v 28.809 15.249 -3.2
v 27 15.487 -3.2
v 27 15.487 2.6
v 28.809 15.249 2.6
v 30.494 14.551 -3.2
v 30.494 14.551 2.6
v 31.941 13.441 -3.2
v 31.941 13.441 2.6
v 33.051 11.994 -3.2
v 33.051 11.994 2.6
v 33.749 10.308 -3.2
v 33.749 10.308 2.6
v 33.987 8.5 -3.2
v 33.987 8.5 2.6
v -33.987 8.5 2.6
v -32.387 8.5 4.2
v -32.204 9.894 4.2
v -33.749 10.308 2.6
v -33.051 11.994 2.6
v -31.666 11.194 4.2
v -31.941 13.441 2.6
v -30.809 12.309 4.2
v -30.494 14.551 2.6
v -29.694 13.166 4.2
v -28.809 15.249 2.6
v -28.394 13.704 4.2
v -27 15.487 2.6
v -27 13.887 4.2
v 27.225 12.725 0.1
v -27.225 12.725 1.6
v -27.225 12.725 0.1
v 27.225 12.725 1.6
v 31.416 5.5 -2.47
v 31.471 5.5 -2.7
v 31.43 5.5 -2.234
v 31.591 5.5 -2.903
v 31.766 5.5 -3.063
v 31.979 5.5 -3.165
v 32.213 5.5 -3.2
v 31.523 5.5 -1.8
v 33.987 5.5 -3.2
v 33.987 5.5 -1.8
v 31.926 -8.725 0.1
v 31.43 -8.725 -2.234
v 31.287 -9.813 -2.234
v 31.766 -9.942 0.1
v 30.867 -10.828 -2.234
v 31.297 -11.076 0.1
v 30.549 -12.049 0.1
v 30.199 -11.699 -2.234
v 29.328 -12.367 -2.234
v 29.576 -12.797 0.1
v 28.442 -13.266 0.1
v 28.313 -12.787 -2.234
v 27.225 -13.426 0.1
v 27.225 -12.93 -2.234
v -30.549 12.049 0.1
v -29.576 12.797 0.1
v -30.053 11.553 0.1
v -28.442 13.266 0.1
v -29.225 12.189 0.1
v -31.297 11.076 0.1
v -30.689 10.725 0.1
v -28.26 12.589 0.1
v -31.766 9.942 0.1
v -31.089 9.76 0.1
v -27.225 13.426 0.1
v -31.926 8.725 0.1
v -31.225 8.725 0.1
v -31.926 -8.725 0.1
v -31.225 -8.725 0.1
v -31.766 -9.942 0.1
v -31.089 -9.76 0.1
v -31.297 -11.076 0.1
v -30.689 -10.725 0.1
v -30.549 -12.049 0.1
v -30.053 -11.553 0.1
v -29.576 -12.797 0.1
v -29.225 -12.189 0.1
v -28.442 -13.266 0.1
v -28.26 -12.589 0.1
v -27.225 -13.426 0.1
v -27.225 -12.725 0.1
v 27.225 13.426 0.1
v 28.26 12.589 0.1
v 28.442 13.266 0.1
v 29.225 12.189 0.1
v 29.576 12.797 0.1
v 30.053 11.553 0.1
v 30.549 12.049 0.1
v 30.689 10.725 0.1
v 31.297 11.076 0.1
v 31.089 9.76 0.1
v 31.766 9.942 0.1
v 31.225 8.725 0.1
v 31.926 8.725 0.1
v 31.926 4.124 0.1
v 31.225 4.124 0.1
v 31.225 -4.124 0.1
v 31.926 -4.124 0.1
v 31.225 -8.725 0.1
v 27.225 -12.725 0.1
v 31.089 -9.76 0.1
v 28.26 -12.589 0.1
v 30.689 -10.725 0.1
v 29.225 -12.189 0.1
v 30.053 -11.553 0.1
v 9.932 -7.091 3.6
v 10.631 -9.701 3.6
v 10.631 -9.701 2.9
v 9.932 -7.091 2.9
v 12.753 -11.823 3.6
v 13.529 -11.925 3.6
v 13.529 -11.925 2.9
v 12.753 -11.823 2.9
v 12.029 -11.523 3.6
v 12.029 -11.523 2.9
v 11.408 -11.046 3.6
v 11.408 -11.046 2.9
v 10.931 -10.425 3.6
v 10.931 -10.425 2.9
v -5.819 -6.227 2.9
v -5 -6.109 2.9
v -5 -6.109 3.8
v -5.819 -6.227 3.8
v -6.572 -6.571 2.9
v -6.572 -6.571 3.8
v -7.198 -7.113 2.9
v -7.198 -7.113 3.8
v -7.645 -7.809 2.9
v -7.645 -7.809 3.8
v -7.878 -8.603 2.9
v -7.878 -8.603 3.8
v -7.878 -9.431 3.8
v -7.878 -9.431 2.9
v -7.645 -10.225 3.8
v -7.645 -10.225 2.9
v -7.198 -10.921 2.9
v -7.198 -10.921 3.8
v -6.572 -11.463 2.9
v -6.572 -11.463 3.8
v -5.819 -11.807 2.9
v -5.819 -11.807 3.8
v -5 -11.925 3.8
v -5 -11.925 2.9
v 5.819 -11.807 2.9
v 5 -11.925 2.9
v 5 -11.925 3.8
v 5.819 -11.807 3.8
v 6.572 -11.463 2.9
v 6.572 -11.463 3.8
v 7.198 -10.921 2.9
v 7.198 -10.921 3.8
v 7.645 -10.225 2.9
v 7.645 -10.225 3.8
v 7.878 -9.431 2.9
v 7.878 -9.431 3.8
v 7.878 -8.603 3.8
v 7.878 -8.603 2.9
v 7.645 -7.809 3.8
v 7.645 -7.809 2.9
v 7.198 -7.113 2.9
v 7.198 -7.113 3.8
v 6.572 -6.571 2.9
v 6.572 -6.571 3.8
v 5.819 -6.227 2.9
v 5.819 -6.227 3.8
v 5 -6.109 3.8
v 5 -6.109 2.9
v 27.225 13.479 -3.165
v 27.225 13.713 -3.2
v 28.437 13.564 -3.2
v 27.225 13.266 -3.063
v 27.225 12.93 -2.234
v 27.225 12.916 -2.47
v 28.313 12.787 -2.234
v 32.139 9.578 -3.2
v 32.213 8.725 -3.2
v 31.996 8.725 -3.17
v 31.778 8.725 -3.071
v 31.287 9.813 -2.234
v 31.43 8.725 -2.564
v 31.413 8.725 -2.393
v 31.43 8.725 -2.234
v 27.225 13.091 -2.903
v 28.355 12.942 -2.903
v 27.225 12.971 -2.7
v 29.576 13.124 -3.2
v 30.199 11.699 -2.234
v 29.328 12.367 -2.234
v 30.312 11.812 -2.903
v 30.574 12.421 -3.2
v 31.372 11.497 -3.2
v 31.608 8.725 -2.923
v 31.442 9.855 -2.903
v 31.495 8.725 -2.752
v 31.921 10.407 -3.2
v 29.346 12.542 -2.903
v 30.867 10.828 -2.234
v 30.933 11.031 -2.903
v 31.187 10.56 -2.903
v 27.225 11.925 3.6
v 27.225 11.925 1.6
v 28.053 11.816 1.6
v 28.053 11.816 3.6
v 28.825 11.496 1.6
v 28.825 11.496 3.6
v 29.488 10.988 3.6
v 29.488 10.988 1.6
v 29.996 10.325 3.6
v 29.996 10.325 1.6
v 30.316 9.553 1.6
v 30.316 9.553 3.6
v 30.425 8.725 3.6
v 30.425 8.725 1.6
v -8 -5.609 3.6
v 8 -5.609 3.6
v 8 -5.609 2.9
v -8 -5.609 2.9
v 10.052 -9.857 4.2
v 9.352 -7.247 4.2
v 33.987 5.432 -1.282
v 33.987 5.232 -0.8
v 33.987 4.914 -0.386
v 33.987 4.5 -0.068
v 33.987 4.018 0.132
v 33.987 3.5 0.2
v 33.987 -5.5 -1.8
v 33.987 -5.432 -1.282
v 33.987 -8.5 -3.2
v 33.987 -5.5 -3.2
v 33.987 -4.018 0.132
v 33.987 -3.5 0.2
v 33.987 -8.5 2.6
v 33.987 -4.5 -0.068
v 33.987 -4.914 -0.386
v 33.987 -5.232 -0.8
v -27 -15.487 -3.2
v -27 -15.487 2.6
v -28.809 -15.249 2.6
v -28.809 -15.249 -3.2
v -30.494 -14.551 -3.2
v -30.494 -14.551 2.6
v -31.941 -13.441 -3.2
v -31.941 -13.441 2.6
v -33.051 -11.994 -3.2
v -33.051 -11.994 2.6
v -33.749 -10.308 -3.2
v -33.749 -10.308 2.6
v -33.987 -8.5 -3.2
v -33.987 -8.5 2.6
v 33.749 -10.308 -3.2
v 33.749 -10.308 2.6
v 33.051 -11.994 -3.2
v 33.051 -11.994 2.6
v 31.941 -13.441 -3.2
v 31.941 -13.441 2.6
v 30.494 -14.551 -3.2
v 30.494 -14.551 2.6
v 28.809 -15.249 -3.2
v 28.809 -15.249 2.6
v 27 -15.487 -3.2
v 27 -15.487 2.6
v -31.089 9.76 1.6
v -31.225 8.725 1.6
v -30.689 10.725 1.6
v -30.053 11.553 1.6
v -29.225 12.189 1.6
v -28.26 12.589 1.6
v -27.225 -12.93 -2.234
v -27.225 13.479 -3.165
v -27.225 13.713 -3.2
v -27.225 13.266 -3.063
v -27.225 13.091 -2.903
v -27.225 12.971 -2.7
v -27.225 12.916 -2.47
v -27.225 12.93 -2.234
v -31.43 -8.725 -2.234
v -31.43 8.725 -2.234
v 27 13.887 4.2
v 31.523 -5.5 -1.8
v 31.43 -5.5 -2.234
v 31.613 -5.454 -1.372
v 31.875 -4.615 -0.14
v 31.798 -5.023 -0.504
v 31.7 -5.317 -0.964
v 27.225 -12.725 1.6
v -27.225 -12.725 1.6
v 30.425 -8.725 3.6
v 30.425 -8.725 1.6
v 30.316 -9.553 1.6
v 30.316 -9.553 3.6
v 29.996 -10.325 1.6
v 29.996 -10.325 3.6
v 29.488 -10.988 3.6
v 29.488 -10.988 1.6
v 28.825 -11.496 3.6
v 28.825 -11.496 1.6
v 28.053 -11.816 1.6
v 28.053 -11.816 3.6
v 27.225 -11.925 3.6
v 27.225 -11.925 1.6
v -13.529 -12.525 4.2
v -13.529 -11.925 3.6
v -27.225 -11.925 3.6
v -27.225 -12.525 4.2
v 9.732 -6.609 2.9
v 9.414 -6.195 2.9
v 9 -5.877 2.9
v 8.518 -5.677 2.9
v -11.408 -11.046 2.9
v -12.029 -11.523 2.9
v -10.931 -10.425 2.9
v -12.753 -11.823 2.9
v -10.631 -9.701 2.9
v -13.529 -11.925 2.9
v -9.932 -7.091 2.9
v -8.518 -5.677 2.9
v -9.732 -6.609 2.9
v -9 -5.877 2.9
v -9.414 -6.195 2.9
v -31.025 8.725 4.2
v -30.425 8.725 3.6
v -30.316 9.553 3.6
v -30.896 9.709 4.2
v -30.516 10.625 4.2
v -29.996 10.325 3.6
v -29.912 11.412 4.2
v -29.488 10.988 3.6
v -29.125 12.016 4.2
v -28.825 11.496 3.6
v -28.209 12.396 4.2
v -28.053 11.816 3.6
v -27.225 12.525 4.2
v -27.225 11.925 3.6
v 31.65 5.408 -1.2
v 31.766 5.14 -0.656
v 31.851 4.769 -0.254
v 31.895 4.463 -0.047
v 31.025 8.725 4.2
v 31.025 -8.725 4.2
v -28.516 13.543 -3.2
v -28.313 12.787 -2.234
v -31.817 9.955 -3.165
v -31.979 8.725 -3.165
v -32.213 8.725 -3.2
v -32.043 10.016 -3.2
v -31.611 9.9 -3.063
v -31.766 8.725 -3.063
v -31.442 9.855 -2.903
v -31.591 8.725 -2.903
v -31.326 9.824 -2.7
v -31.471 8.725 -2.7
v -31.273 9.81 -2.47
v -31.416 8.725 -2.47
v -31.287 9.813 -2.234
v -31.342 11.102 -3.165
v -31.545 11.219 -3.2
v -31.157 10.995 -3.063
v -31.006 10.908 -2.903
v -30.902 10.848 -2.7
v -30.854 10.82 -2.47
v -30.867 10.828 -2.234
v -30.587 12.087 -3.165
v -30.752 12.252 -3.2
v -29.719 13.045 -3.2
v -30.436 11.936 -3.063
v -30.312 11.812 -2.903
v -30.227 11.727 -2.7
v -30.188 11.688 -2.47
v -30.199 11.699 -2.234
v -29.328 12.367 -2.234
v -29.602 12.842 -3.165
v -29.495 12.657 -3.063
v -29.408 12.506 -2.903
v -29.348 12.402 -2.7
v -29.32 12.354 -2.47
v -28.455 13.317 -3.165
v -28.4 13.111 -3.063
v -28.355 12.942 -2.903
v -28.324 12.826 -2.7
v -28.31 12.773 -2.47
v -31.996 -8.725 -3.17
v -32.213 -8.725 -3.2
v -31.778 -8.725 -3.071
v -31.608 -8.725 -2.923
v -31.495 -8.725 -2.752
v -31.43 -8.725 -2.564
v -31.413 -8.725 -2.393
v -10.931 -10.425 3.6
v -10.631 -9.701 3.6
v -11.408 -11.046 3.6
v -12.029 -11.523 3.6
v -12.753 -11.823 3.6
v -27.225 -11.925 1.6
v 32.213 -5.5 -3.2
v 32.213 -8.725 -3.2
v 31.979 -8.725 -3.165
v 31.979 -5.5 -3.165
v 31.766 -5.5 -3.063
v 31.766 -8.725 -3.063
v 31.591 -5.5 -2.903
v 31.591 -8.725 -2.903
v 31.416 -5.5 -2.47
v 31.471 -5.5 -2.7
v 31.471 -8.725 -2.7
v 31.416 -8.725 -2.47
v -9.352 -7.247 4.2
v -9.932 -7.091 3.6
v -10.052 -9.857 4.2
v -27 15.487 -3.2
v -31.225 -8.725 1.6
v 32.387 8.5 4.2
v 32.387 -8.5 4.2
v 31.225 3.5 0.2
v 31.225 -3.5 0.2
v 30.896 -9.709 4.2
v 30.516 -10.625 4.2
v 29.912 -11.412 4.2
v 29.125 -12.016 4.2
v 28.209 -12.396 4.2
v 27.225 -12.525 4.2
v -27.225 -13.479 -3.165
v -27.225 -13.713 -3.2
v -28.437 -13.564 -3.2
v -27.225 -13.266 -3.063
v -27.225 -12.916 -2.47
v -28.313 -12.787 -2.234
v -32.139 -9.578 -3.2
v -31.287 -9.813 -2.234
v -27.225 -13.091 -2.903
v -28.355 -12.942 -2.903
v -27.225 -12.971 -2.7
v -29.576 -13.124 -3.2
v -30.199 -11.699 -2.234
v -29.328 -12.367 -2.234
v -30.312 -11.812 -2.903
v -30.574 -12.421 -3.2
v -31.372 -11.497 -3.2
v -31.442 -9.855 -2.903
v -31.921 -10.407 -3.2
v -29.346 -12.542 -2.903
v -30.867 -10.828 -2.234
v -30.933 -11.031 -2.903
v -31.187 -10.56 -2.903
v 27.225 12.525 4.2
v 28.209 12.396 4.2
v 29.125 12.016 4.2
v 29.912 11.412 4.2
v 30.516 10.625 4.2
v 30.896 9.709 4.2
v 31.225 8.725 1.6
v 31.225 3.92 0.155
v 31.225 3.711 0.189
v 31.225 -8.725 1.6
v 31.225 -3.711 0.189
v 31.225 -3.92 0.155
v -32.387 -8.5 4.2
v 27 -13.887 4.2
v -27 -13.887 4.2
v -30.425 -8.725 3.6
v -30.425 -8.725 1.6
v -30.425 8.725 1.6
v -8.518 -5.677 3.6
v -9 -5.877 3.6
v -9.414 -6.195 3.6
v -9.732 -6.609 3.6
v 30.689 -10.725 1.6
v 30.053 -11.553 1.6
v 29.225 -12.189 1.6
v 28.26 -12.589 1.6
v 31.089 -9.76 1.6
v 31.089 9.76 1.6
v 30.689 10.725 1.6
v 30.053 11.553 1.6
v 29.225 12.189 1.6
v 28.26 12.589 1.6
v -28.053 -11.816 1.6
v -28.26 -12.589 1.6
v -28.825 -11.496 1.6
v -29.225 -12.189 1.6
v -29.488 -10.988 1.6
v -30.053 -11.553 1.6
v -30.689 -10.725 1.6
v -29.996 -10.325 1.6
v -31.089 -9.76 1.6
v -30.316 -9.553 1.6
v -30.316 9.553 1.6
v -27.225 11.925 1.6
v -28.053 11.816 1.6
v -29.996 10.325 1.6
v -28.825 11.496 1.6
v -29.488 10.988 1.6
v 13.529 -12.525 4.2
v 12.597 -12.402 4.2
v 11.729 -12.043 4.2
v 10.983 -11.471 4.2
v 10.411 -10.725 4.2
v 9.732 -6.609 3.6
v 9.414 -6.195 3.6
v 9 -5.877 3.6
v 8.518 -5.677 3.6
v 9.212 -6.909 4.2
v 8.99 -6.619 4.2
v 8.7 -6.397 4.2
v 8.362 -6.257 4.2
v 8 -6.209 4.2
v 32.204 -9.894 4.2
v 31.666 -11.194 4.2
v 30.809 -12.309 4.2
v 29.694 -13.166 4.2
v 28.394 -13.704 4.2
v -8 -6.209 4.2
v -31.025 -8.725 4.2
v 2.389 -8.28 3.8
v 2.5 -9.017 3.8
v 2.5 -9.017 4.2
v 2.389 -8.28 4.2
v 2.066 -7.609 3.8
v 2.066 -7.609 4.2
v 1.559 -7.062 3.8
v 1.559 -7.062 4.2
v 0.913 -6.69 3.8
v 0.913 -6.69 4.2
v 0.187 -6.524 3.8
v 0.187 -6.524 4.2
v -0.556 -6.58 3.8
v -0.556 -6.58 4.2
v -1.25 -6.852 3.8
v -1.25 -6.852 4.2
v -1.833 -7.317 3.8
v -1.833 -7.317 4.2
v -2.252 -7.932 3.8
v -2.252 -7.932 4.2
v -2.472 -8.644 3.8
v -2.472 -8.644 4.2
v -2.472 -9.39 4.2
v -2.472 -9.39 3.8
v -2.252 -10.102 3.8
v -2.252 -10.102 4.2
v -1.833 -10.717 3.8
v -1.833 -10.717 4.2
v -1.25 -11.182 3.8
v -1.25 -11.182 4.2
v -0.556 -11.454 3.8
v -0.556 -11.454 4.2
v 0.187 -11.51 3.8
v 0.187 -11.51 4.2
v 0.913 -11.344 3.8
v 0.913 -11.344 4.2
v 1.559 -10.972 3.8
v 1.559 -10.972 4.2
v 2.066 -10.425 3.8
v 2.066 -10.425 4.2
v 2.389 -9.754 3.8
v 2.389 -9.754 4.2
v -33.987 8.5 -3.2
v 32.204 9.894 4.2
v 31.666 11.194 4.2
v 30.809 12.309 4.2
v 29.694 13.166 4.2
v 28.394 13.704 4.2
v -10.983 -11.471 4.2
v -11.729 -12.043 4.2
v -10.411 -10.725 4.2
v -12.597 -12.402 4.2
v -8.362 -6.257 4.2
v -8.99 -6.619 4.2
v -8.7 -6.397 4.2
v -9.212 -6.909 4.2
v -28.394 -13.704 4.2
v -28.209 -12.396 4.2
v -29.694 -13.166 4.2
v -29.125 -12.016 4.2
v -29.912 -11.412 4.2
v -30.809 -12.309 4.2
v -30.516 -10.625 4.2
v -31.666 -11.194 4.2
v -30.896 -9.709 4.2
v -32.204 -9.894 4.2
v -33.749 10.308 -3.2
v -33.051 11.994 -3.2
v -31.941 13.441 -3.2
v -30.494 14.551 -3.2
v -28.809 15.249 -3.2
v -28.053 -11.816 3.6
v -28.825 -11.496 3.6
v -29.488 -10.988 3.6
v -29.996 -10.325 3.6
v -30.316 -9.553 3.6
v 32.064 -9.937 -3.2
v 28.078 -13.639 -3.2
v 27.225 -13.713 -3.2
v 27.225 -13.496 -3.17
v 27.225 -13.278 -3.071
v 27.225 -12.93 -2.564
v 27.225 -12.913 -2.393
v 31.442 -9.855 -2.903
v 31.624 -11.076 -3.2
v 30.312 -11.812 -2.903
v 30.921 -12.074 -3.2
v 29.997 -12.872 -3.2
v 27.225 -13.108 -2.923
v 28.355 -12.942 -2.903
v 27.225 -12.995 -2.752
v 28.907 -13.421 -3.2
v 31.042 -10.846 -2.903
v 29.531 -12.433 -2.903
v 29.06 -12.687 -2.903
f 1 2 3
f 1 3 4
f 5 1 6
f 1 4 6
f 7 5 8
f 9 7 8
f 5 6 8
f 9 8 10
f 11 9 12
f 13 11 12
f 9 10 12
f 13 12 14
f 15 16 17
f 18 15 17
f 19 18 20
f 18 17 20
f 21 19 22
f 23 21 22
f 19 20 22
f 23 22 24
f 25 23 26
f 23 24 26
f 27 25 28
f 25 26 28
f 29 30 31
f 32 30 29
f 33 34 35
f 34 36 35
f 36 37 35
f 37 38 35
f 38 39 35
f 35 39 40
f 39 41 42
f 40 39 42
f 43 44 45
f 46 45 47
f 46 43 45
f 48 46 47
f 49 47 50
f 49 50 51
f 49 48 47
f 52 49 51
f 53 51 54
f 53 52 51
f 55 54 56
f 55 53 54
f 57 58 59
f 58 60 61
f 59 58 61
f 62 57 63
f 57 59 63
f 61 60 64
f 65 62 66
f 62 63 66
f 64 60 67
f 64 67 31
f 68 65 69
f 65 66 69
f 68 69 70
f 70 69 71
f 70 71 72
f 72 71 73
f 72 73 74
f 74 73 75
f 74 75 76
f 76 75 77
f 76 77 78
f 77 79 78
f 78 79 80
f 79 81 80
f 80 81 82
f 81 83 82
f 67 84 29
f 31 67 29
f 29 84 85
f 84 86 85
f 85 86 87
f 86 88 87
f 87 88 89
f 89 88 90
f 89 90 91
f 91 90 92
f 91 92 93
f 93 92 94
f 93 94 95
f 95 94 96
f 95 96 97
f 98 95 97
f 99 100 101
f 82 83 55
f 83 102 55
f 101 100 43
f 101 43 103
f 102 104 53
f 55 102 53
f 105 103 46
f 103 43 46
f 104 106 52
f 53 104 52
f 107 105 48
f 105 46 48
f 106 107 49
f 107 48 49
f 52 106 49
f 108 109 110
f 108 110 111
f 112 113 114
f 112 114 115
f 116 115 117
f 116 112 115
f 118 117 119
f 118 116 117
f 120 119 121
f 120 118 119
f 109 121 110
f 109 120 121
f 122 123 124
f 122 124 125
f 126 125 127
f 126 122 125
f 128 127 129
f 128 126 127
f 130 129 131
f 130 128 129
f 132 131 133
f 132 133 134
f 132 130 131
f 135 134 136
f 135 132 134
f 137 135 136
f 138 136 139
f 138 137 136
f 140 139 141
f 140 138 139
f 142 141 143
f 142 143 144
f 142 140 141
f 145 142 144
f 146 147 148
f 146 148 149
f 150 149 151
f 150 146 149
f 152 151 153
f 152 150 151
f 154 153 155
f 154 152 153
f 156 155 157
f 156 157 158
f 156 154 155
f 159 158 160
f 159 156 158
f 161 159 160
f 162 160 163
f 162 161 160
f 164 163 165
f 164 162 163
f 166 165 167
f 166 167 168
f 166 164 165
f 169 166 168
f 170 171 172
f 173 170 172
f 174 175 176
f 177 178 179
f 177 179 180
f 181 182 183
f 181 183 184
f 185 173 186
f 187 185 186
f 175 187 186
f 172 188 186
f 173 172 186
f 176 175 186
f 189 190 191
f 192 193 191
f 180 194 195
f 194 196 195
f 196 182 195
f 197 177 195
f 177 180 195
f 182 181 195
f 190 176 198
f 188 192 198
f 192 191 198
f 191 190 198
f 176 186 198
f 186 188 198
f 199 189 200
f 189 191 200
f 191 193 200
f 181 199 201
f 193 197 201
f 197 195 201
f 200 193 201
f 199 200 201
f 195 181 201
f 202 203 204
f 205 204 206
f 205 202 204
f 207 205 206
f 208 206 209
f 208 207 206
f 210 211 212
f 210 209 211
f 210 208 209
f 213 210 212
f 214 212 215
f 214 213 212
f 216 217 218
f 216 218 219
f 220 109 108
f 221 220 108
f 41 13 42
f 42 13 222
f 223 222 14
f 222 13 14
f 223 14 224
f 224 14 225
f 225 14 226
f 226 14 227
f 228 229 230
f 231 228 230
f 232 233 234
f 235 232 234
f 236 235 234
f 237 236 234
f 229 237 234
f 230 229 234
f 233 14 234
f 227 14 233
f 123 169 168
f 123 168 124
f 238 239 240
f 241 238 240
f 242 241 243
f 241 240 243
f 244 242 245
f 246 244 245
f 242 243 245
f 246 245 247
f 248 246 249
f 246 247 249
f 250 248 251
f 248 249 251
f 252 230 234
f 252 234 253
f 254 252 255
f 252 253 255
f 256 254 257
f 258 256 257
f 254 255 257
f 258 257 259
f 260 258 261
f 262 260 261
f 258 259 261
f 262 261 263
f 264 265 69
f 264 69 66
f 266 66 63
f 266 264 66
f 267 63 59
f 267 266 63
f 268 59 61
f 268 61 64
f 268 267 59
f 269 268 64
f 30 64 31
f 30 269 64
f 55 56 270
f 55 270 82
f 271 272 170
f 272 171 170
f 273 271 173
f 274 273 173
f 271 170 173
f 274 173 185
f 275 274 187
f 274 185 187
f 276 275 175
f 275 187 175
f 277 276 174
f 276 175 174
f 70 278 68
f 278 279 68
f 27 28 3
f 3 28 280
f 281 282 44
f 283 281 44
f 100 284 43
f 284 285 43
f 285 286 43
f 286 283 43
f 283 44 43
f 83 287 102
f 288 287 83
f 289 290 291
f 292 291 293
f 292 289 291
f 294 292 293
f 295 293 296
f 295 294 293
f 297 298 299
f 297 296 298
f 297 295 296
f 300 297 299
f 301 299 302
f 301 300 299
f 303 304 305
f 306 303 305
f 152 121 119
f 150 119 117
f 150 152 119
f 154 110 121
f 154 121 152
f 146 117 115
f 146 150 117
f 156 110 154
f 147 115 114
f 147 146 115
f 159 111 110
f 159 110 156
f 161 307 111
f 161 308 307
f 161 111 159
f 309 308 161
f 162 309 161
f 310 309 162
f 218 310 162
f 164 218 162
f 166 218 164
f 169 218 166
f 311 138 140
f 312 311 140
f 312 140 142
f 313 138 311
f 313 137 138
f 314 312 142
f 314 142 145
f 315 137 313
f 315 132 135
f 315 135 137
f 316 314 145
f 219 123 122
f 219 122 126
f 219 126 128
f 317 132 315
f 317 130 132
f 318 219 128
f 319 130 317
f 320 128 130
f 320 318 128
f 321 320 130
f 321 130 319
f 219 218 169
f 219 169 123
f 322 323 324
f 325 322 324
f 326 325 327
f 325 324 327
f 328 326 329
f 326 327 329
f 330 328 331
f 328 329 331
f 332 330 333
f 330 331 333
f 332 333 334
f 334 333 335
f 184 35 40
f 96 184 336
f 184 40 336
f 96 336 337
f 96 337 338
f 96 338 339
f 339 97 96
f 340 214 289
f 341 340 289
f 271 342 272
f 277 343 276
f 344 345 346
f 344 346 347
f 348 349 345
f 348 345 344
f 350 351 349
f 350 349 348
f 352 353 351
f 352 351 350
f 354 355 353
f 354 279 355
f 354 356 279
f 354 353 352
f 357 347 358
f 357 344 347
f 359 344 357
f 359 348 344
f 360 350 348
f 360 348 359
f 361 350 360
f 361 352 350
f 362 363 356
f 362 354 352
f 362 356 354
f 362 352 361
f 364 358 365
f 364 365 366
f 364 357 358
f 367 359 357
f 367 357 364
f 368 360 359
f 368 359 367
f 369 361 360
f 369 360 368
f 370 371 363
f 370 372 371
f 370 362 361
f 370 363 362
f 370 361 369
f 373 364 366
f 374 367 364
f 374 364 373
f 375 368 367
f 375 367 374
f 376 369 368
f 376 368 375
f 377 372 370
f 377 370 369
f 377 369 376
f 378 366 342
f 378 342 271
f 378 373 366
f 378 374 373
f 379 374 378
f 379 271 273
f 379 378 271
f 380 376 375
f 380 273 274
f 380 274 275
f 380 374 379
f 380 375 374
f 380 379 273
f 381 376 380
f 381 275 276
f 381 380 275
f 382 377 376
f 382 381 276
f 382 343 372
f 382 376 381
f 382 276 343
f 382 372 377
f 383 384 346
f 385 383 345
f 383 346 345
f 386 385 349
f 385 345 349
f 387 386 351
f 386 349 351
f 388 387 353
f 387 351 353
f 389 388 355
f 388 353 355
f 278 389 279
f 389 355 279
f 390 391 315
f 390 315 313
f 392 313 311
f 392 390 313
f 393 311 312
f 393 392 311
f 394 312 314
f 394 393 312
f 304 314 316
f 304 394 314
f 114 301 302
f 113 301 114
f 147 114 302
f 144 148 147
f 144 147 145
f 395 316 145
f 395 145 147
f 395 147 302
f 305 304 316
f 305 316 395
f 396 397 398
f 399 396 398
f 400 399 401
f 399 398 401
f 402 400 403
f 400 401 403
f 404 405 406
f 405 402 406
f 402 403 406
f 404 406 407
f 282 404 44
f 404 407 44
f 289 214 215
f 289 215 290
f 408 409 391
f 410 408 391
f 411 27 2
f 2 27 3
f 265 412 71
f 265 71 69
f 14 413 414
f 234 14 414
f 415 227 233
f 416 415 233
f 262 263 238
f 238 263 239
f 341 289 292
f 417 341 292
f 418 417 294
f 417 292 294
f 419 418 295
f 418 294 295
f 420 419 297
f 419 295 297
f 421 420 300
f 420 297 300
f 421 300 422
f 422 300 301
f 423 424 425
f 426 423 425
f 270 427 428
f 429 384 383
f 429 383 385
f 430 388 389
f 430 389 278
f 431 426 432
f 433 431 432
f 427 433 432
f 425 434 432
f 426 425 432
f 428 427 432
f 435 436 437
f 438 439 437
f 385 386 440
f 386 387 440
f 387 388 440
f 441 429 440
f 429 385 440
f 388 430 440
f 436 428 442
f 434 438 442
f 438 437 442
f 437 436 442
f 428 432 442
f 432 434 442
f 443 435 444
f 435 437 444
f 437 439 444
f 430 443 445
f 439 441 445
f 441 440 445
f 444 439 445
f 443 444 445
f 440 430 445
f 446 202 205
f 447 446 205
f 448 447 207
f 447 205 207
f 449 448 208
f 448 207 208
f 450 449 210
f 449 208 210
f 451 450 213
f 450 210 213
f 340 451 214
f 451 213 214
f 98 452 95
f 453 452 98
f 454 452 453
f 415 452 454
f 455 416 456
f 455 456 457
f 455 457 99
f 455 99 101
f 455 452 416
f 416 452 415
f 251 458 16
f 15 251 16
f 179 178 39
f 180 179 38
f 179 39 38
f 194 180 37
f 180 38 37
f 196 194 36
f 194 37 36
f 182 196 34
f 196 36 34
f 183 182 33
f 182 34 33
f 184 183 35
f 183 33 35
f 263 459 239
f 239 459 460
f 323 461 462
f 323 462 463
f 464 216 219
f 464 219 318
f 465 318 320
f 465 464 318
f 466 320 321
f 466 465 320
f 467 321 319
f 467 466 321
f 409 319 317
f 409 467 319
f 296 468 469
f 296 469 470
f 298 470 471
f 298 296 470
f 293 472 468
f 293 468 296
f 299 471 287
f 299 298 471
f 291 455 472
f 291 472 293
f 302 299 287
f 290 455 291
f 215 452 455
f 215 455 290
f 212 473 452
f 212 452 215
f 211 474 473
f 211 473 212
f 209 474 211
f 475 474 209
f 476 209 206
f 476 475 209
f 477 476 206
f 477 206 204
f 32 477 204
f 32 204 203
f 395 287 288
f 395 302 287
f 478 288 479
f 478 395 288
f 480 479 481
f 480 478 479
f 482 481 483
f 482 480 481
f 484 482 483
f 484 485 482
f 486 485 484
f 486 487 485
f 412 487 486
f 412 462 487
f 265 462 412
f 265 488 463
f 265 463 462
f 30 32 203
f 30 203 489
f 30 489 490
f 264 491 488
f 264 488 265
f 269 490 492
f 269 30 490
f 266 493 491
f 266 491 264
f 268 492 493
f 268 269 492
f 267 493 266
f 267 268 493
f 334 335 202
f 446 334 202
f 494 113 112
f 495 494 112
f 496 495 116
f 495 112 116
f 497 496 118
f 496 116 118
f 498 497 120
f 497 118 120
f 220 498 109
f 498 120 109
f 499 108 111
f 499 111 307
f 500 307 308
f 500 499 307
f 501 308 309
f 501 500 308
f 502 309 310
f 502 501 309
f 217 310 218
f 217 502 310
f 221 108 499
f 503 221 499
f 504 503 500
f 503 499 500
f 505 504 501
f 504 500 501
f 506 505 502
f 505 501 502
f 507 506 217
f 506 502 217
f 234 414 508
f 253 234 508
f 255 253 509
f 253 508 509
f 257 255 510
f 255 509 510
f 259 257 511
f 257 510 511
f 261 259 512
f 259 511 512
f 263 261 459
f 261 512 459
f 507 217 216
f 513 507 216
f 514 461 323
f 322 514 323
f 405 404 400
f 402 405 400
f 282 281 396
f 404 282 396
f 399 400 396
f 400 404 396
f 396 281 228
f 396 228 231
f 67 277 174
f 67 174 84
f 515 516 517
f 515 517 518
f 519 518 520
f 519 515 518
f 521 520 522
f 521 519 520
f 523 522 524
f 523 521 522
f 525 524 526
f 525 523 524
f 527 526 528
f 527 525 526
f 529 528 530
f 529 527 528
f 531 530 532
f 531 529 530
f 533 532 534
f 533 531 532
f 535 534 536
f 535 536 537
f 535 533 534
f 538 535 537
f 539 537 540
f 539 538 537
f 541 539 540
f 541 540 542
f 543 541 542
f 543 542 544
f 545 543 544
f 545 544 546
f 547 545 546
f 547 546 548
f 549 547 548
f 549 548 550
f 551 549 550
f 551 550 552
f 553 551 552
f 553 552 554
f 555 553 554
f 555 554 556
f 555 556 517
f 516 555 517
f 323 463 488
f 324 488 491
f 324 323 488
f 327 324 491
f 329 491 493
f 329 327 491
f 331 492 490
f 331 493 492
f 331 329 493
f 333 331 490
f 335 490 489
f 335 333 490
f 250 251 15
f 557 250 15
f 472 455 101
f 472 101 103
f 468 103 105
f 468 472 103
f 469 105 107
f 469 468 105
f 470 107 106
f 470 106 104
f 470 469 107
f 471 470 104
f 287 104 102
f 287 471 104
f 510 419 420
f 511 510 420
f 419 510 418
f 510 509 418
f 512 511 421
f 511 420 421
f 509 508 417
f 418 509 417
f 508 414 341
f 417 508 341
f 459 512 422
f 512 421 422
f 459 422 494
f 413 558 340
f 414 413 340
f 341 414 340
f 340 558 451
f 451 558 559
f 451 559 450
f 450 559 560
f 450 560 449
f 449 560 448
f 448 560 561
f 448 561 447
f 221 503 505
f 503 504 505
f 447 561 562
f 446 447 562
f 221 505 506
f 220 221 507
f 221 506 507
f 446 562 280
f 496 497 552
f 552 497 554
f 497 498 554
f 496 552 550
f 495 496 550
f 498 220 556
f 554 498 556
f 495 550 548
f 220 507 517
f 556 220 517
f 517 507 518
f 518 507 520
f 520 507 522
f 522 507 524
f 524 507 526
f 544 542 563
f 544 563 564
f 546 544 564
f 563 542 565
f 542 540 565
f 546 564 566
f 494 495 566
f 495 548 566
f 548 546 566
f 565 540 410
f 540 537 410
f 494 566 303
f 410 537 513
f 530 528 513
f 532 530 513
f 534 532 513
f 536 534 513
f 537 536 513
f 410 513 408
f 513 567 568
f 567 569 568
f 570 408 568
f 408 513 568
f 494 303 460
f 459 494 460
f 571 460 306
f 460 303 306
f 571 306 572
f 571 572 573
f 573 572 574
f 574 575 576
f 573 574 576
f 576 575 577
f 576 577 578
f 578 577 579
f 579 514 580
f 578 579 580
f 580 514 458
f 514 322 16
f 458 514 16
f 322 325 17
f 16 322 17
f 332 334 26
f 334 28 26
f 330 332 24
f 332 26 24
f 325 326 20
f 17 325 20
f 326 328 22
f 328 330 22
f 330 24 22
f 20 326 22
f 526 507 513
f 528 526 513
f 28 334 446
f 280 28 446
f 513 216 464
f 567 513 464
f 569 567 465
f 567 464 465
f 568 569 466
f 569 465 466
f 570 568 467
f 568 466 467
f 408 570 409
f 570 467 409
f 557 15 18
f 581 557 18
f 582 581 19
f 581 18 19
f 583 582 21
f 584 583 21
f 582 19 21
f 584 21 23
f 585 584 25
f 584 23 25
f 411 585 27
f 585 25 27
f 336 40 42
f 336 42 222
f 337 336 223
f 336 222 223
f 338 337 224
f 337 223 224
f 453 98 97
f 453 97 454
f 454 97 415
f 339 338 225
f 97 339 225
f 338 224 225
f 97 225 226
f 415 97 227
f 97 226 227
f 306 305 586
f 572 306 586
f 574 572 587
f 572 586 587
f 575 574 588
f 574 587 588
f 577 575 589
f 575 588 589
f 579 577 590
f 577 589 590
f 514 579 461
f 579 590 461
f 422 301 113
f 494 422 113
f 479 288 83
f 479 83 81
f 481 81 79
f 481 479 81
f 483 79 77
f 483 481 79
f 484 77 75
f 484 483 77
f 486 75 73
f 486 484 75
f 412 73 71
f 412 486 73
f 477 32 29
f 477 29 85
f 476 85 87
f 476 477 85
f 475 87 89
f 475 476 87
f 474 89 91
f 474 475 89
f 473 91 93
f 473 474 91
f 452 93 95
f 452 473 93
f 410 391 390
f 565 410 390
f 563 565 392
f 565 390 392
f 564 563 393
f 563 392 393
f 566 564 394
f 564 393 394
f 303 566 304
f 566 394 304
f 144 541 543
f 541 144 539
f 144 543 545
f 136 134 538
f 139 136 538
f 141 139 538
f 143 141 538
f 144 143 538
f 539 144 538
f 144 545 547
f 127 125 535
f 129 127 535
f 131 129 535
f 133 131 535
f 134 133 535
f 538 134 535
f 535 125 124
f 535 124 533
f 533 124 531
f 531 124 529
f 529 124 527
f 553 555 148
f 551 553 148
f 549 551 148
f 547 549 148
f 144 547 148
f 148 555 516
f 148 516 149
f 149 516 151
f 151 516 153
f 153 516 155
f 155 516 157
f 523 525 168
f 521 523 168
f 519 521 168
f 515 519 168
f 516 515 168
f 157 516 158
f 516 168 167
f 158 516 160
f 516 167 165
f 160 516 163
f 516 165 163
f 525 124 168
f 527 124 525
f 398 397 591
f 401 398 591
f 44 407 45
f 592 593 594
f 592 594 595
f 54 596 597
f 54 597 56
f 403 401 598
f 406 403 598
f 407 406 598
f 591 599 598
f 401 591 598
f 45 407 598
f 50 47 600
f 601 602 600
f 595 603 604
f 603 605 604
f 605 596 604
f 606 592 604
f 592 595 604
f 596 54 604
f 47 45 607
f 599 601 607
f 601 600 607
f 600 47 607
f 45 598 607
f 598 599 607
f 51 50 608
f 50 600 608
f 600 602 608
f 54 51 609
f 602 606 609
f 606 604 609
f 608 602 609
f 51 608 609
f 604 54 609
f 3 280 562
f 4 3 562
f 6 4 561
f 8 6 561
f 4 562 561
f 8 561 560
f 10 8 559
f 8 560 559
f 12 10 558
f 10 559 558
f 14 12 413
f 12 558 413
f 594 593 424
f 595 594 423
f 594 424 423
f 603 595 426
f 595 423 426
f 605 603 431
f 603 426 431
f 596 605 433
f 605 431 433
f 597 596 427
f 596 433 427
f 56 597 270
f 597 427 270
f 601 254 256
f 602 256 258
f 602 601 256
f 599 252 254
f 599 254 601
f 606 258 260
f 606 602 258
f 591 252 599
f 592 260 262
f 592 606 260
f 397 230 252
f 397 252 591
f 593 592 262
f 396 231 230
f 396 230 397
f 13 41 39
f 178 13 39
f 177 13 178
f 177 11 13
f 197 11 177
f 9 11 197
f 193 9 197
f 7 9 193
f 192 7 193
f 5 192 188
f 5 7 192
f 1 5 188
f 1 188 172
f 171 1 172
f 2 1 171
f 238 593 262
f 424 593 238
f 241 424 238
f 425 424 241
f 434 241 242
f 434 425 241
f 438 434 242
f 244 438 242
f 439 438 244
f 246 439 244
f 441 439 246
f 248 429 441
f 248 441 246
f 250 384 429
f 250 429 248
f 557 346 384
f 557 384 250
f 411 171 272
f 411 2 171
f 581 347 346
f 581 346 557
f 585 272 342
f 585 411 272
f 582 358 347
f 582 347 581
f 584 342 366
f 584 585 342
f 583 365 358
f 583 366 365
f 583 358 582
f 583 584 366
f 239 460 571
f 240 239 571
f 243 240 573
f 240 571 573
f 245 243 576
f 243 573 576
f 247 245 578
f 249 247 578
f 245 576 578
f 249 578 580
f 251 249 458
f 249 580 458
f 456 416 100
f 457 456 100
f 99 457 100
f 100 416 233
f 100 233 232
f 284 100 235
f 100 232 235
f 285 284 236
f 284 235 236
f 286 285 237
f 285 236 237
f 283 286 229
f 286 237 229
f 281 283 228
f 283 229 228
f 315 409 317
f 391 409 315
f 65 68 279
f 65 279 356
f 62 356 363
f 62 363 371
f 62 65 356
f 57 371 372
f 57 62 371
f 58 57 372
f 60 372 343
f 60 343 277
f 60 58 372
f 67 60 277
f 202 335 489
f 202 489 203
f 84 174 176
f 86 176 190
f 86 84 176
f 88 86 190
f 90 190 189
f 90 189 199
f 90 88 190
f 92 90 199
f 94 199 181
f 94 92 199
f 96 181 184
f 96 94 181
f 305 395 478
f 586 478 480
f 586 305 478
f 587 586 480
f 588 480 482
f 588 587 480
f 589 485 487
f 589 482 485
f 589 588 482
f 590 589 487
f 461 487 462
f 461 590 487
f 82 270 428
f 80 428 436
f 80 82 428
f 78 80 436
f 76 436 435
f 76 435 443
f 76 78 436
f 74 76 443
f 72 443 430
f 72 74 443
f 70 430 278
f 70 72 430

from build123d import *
from build123d.topology import SkipClean

# Parameters (mm, degrees)
SKIZZE1_W                         = 7.626009652
SKIZZE1_H                         = 10.039014478
AUFSATZ_LINEAR_AUSTRAGEN1_DEPTH   = 1.5
AUFSATZ_LINEAR_AUSTRAGEN1_2_DEPTH = 1.5
AUFSATZ_LINEAR_AUSTRAGEN1_3_DEPTH = 1.5
AUFSATZ_LINEAR_AUSTRAGEN1_4_DEPTH = 1.5
AUFSATZ_LINEAR_AUSTRAGEN1_5_DEPTH = 1.5
SKIZZE2_R                         = 2.5
AUFSATZ_LINEAR_AUSTRAGEN2_DEPTH   = 0.4
AUFSATZ_LINEAR_AUSTRAGEN3_DEPTH   = 2.2
AUFSATZ_LINEAR_AUSTRAGEN14_DEPTH  = 7
SKIZZE14_R                        = 2.5
SKIZZE14_W                        = 7.626009652
SKIZZE14_H                        = 10.039014478
AUFSATZ_LINEAR_AUSTRAGEN15_DEPTH  = 0.9
VERRUNDUNG1_R                     = 0.8
SCHNITT_LINEAR_AUSTRAGEN1_DEPTH   = 5
SCHNITT_LINEAR_AUSTRAGEN2_DEPTH   = 0.9
FASE1_SIZE                        = 1.6
SCHNITT_LINEAR_AUSTRAGEN4_DEPTH   = 39.075689459
FASE2_SIZE                        = 0.6


with BuildPart() as part:
    # Skizze1 → Aufsatz-Linear austragen1 (new body)
    with BuildSketch(Plane.XY.offset(2.3000508)):
        with Locations((-8.282016764, -0.163000133)):
            Rectangle(SKIZZE1_W, SKIZZE1_H)
        Polygon((-11.69502159, 4.456507106), (-5.069011938, 4.456507106), (-5.069011938, -4.582507372), (-9.09502159, -4.582507372), (-11.69502159, -4.124057223), (-11.69502159, 0.203832093), (-9.09502159, 0.900499994), (-7.35501651, 0.900499994), (-7.35501651, -0.899500006), (-9.89502159, -0.899500006), (-9.89502159, -2.782507372), (-6.869011938, -2.782507372), (-6.869011938, 2.656507106), (-11.69502159, 2.656507106), align=None, mode=Mode.SUBTRACT)
    extrude(amount=AUFSATZ_LINEAR_AUSTRAGEN1_DEPTH)



with BuildPart() as body_2:
    # Skizze1 → Aufsatz-Linear austragen1 2 (new body)
    with BuildSketch(Plane.XY.offset(2.3000508)):
        Polygon((-15.915075673, 4.956507106), (-28.451054102, 4.956507106), (-28.451054102, -5.082507372), (-25.651054102, -5.082507372), (-25.651054102, 2.156507106), (-22.99004318, 2.156507106), (-22.99004318, -5.082507372), (-20.19004318, -5.082507372), (-20.19004318, 2.156507106), (-17.91003302, 2.156507106), (-17.91003302, -5.082507372), (-15.11003302, -5.082507372), (-15.11003302, 2.744670596), align=None)
        Polygon((-27.951054102, -4.582507372), (-26.151054102, -4.582507372), (-26.151054102, 2.656507106), (-22.49004318, 2.656507106), (-22.49004318, -4.582507372), (-20.69004318, -4.582507372), (-20.69004318, 2.656507106), (-17.41003302, 2.656507106), (-17.41003302, -4.582507372), (-15.61003302, -4.582507372), (-15.61003302, 2.656507106), (-16.265179442, 4.456507106), (-27.951054102, 4.456507106), align=None, mode=Mode.SUBTRACT)
    extrude(amount=AUFSATZ_LINEAR_AUSTRAGEN1_2_DEPTH)


with BuildPart() as body_3:
    # Skizze1 → Aufsatz-Linear austragen1 3 (new body)
    with BuildSketch(Plane.XY.offset(2.3000508)):
        Polygon((5.972009144, 4.956507106), (3.559004318, 4.956507106), (3.559004318, 8.89351498), (0.759004318, 8.89351498), (0.759004318, 4.956507106), (-1.654000508, 4.956507106), (-1.654000508, 2.156507106), (0.759004318, 2.156507106), (0.759004318, -5.082507372), (5.972009144, -5.082507372), (5.972009144, -2.282507372), (3.559004318, -2.282507372), (3.559004318, 2.156507106), (5.972009144, 2.156507106), align=None)
        Polygon((1.259004318, 8.39351498), (1.259004318, 4.456507106), (-1.154000508, 4.456507106), (-1.154000508, 2.656507106), (1.259004318, 2.656507106), (1.259004318, -4.582507372), (5.472009144, -4.582507372), (5.472009144, -2.782507372), (3.059004318, -2.782507372), (3.059004318, 2.656507106), (5.472009144, 2.656507106), (5.472009144, 4.456507106), (3.059004318, 4.456507106), (3.059004318, 8.39351498), align=None, mode=Mode.SUBTRACT)
    extrude(amount=AUFSATZ_LINEAR_AUSTRAGEN1_3_DEPTH)


with BuildPart() as body_4:
    # Skizze1 → Aufsatz-Linear austragen1 4 (new body)
    with BuildSketch(Plane.XY.offset(2.3000508)):
        Polygon((10.972977453, 4.956507106), (16.513030226, 4.956507106), (16.513030226, 2.156507106), (12.264129895, 2.156507106), (11.687020574, 1.579397784), (11.687020574, -1.705398051), (12.264129895, -2.282507372), (16.513030226, -2.282507372), (16.513030226, -5.082507372), (10.972977453, -5.082507372), (8.887020574, -3.332181725), (8.887020574, 3.206181458), align=None)
        Polygon((16.013030226, 2.656507106), (12.057023114, 2.656507106), (11.187020574, 1.786504566), (11.187020574, -1.912504832), (12.057023114, -2.782507372), (16.013030226, -2.782507372), (16.013030226, -4.582507372), (11.15496257, -4.582507372), (9.387020574, -3.099027896), (9.387020574, 2.973027629), (11.15496257, 4.456507106), (16.013030226, 4.456507106), align=None, mode=Mode.SUBTRACT)
    extrude(amount=AUFSATZ_LINEAR_AUSTRAGEN1_4_DEPTH)


with BuildPart() as body_5:
    # Skizze1 → Aufsatz-Linear austragen1 5 (new body)
    with BuildSketch(Plane.XY.offset(2.3000508)):
        Polygon((27.321990188, 4.856507106), (22.128041656, 4.856507106), (22.128041656, 8.666514726), (19.528041656, 8.666514726), (19.528041656, -4.982507372), (22.128041656, -4.982507372), (22.128041656, 2.256507106), (25.497053594, 2.256507106), (25.497053594, -4.982507372), (28.097053594, -4.982507372), (28.097053594, 2.727037898), align=None)
        Polygon((19.928041656, 8.266514726), (19.928041656, -4.582507372), (21.728041656, -4.582507372), (21.728041656, 2.656507106), (25.897053594, 2.656507106), (25.897053594, -4.582507372), (27.697053594, -4.582507372), (27.697053594, 2.656507106), (27.041907172, 4.456507106), (21.728041656, 4.456507106), (21.728041656, 8.266514726), align=None, mode=Mode.SUBTRACT)
    extrude(amount=AUFSATZ_LINEAR_AUSTRAGEN1_5_DEPTH)


with BuildPart() as part_1:
    add(part.part)

    add(body_2.part)  # Aufsatz-Linear austragen2 merges body 2

    add(body_3.part)  # Aufsatz-Linear austragen2 merges body 3

    add(body_4.part)  # Aufsatz-Linear austragen2 merges body 4

    add(body_5.part)  # Aufsatz-Linear austragen2 merges body 5
    # Skizze2 → Aufsatz-Linear austragen2 (add)
    with BuildSketch(Plane.XY.offset(3.8000508)):
        with BuildLine():
            Line((-27.00005334, 15.487325375), (27.00005588, 15.487325375))
            ThreePointArc((27.00005588, 15.487325375), (31.940828463, 13.440790362), (33.987363475, 8.50001778))
            Line((33.987363475, 8.50001778), (33.987363475, -8.50001778))
            ThreePointArc((33.987363475, -8.50001778), (31.940828463, -13.440790362), (27.00005588, -15.487325375))
            Line((27.00005588, -15.487325375), (-27.00005334, -15.487325375))
            ThreePointArc((-27.00005334, -15.487325375), (-31.940825922, -13.440790362), (-33.987360935, -8.50001778))
            Line((-33.987360935, -8.50001778), (-33.987360935, 8.50001778))
            ThreePointArc((-33.987360935, 8.50001778), (-31.940825922, 13.440790362), (-27.00005334, 15.487325375))
        make_face()
        with Locations((0, -9.017018034)):
            Circle(SKIZZE2_R, mode=Mode.SUBTRACT)
    extrude(amount=AUFSATZ_LINEAR_AUSTRAGEN2_DEPTH)

    # Skizze3 → Aufsatz-Linear austragen3 (add)
    with BuildSketch(Plane(origin=(0, 0, 3.8000508), x_dir=(-1, 0, 0), z_dir=(0, 0, -1))):
        with BuildLine():
            Line((-27.225, -12.725), (27.225, -12.725))
            ThreePointArc((27.225, -12.725), (30.053427125, -11.553427125), (31.225, -8.725))
            Line((31.225, -8.725), (31.225, 8.725))
            ThreePointArc((31.225, 8.725), (30.053427125, 11.553427125), (27.225, 12.725))
            Line((27.225, 12.725), (-27.225, 12.725))
            ThreePointArc((-27.225, 12.725), (-30.053427125, 11.553427125), (-31.225, 8.725))
            Line((-31.225, 8.725), (-31.225, -8.725))
            ThreePointArc((-31.225, -8.725), (-30.053427125, -11.553427125), (-27.225, -12.725))
        make_face()
        with BuildLine():
            Line((-27.225, 11.925), (27.225, 11.925))
            ThreePointArc((27.225, 11.925), (29.4877417, 10.9877417), (30.425, 8.725))
            Line((30.425, 8.725), (30.425, -8.725))
            ThreePointArc((30.425, -8.725), (29.4877417, -10.9877417), (27.225, -11.925))
            Line((27.225, -11.925), (-27.225, -11.925))
            ThreePointArc((-27.225, -11.925), (-29.4877417, -10.9877417), (-30.425, -8.725))
            Line((-30.425, -8.725), (-30.425, 8.725))
            ThreePointArc((-30.425, 8.725), (-29.4877417, 10.9877417), (-27.225, 11.925))
        make_face(mode=Mode.SUBTRACT)
    extrude(amount=AUFSATZ_LINEAR_AUSTRAGEN3_DEPTH)

    # Skizze10 → Aufsatz-Linear austragen14 (add)
    with BuildSketch(Plane(origin=(0, 0, 3.8000508), x_dir=(-1, 0, 0), z_dir=(0, 0, -1))):
        with BuildLine():
            Line((27.00005334, 15.487325375), (-27.00005588, 15.487325375))
            ThreePointArc((-27.00005588, 15.487325375), (-31.940828463, 13.440790362), (-33.987363475, 8.50001778))
            Line((-33.987363475, 8.50001778), (-33.987363475, -8.50001778))
            ThreePointArc((-33.987363475, -8.50001778), (-31.940828463, -13.440790362), (-27.00005588, -15.487325375))
            Line((-27.00005588, -15.487325375), (27.00005334, -15.487325375))
            ThreePointArc((27.00005334, -15.487325375), (31.940825922, -13.440790362), (33.987360935, -8.50001778))
            Line((33.987360935, -8.50001778), (33.987360935, 8.50001778))
            ThreePointArc((33.987360935, 8.50001778), (31.940825922, 13.440790362), (27.00005334, 15.487325375))
        make_face()
        with BuildLine():
            Line((31.225, -8.725), (31.225, 8.725))
            ThreePointArc((31.225, 8.725), (30.053427125, 11.553427125), (27.225, 12.725))
            Line((27.225, 12.725), (-27.225, 12.725))
            ThreePointArc((-27.225, 12.725), (-30.053427125, 11.553427125), (-31.225, 8.725))
            Line((-31.225, 8.725), (-31.225, -8.725))
            ThreePointArc((-31.225, -8.725), (-30.053427125, -11.553427125), (-27.225, -12.725))
            Line((-27.225, -12.725), (27.225, -12.725))
            ThreePointArc((27.225, -12.725), (30.053427125, -11.553427125), (31.225, -8.725))
        make_face(mode=Mode.SUBTRACT)
    extrude(amount=AUFSATZ_LINEAR_AUSTRAGEN14_DEPTH)

    # Skizze14 → Aufsatz-Linear austragen15 (add)
    with BuildSketch(Plane(origin=(0, 0, 3.8000508), x_dir=(-1, 0, 0), z_dir=(0, 0, -1))):
        with BuildLine():
            Line((27.225, 11.925), (-27.225, 11.925))
            ThreePointArc((-27.225, 11.925), (-29.4877417, 10.9877417), (-30.425, 8.725))
            Line((-30.425, 8.725), (-30.425, -8.725))
            ThreePointArc((-30.425, -8.725), (-29.4877417, -10.9877417), (-27.225, -11.925))
            Line((-27.225, -11.925), (27.225, -11.925))
            ThreePointArc((27.225, -11.925), (29.4877417, -10.9877417), (30.425, -8.725))
            Line((30.425, -8.725), (30.425, 8.725))
            ThreePointArc((30.425, 8.725), (29.4877417, 10.9877417), (27.225, 11.925))
        make_face()
        with Locations((0, -9.017018034)):
            Circle(SKIZZE14_R, mode=Mode.SUBTRACT)
        with Locations((8.282016764, -0.163000133)):
            Rectangle(SKIZZE14_W, SKIZZE14_H, mode=Mode.SUBTRACT)
        Polygon((15.915075673, 4.956507106), (15.11003302, 2.744670596), (15.11003302, -5.082507372), (17.91003302, -5.082507372), (17.91003302, 2.156507106), (20.19004318, 2.156507106), (20.19004318, -5.082507372), (22.99004318, -5.082507372), (22.99004318, 2.156507106), (25.651054102, 2.156507106), (25.651054102, -5.082507372), (28.451054102, -5.082507372), (28.451054102, 4.956507106), align=None, mode=Mode.SUBTRACT)
        Polygon((-5.972009144, 4.956507106), (-5.972009144, 2.156507106), (-3.559004318, 2.156507106), (-3.559004318, -2.282507372), (-5.972009144, -2.282507372), (-5.972009144, -5.082507372), (-0.759004318, -5.082507372), (-0.759004318, 2.156507106), (1.654000508, 2.156507106), (1.654000508, 4.956507106), (-0.759004318, 4.956507106), (-0.759004318, 8.89351498), (-3.559004318, 8.89351498), (-3.559004318, 4.956507106), align=None, mode=Mode.SUBTRACT)
        Polygon((-8.887020574, 3.206181458), (-10.972977453, 4.956507106), (-16.513030226, 4.956507106), (-16.513030226, 2.156507106), (-12.264129895, 2.156507106), (-11.687020574, 1.579397784), (-11.687020574, -1.705398051), (-12.264129895, -2.282507372), (-16.513030226, -2.282507372), (-16.513030226, -5.082507372), (-10.972977453, -5.082507372), (-8.887020574, -3.332181725), align=None, mode=Mode.SUBTRACT)
        Polygon((-27.321990188, 4.856507106), (-28.097053594, 2.727037898), (-28.097053594, -4.982507372), (-25.497053594, -4.982507372), (-25.497053594, 2.256507106), (-22.128041656, 2.256507106), (-22.128041656, -4.982507372), (-19.528041656, -4.982507372), (-19.528041656, 8.666514726), (-22.128041656, 8.666514726), (-22.128041656, 4.856507106), align=None, mode=Mode.SUBTRACT)
    extrude(amount=AUFSATZ_LINEAR_AUSTRAGEN15_DEPTH)

    # Schnitt-Austragung1: sweep along a path in Skizze12
    with BuildLine(Plane(origin=(0, 0, -3.1999492), x_dir=(-1, 0, 0), z_dir=(0, 0, -1))) as schnitt_austragung1_path:
        Line((31.225, -8.725), (31.225, 8.725))
        ThreePointArc((31.225, 8.725), (30.053427125, 11.553427125), (27.225, 12.725))
        Line((27.225, 12.725), (-27.225, 12.725))
        ThreePointArc((-27.225, 12.725), (-30.053427125, 11.553427125), (-31.225, 8.725))
        Line((-31.225, 8.725), (-31.225, -8.725))
        ThreePointArc((-31.225, -8.725), (-30.053427125, -11.553427125), (-27.225, -12.725))
        Line((-27.225, -12.725), (27.225, -12.725))
        ThreePointArc((27.225, -12.725), (30.053427125, -11.553427125), (31.225, -8.725))
    # Skizze11 → Schnitt-Austragung1 (sweep, cut)
    with BuildSketch(Plane(origin=(0, 0, 0), x_dir=(0, 0, -1), z_dir=(1, 0, 0))):
        Polygon((3.1999492, 12.725), (-0.1000508, 12.725), (-0.1000508, 13.426436654), align=None)
    sweep(path=schnitt_austragung1_path.line, mode=Mode.SUBTRACT)

    # Verrundung1
    verrundung1_edges = [part_1.edges().sort_by_distance(p)[0] for p in [
        (0, 12.725, -3.1999492),
        (30.053427125, 11.553427125, -3.1999492),
        (31.225, 0, -3.1999492),
        (30.053427125, -11.553427125, -3.1999492),
        (-31.225, 0, -3.1999492),
        (0, -12.725, -3.1999492),
        (-30.053427125, -11.553427125, -3.1999492),
        (-30.053427125, 11.553427125, -3.1999492),
        (0, 12.725, -3.1999492),
    ]]
    fillet(verrundung1_edges, radius=VERRUNDUNG1_R)

    # Skizze13 → Schnitt-Linear austragen1 (cut)
    with BuildSketch(Plane(origin=(33.987363475, 0, 0), x_dir=(0, 0, -1), z_dir=(1, 0, 0))):
        with BuildLine():
            Line((1.7999492, -5.5), (3.9999492, -5.5))
            ThreePointArc((3.9999492, -5.5), (5.414162762, -4.914213562), (5.9999492, -3.5))
            Line((5.9999492, -3.5), (5.9999492, 3.5))
            ThreePointArc((5.9999492, 3.5), (5.414162762, 4.914213562), (3.9999492, 5.5))
            Line((3.9999492, 5.5), (1.7999492, 5.5))
            ThreePointArc((1.7999492, 5.5), (0.385735638, 4.914213562), (-0.2000508, 3.5))
            Line((-0.2000508, 3.5), (-0.2000508, -3.5))
            ThreePointArc((-0.2000508, -3.5), (0.385735638, -4.914213562), (1.7999492, -5.5))
        make_face()
    extrude(amount=-SCHNITT_LINEAR_AUSTRAGEN1_DEPTH, mode=Mode.SUBTRACT)

    # Skizze15 → Schnitt-Linear austragen2 (cut)
    with SkipClean():  # the faces are left unmerged after this step: merging them gives an invalid solid
        with BuildSketch(Plane(origin=(0, 0, 2.9000508), x_dir=(-1, 0, 0), z_dir=(0, 0, -1))):
            with BuildLine():
                Line((-5, -6.109036068), (5, -6.109036068))
                ThreePointArc((5, -6.109036068), (7.907981966, -9.017018034), (5, -11.925))
                Line((5, -11.925), (-5, -11.925))
                ThreePointArc((-5, -11.925), (-7.907981966, -9.017018034), (-5, -6.109036068))
            make_face()
        extrude(amount=-SCHNITT_LINEAR_AUSTRAGEN2_DEPTH, mode=Mode.SUBTRACT)

    # Fase1
    fase1_edges = [part_1.edges().sort_by_distance(p)[0] for p in [
        (-31.940825922, 13.440790362, 4.2000508),
        (-33.987360935, 0, 4.2000508),
        (-31.940825922, -13.440790362, 4.2000508),
        (1.27e-06, -15.487325375, 4.2000508),
        (31.940828463, -13.440790362, 4.2000508),
        (33.987363475, 0, 4.2000508),
        (31.940828463, 13.440790362, 4.2000508),
        (1.27e-06, 15.487325375, 4.2000508),
    ]]
    chamfer(fase1_edges, length=FASE1_SIZE)

    # Skizze18 → Schnitt-Linear austragen4 (cut, through all)
    with SkipClean():  # the faces are left unmerged after this step: merging them gives an invalid solid
        with BuildSketch(Plane.XY.offset(4.2000508)):
            with BuildLine():
                Line((-27.225, 11.925), (27.225, 11.925))
                ThreePointArc((27.225, 11.925), (29.4877417, 10.9877417), (30.425, 8.725))
                Line((30.425, 8.725), (30.425, -8.725))
                ThreePointArc((30.425, -8.725), (29.4877417, -10.9877417), (27.225, -11.925))
                Line((27.225, -11.925), (13.528992375, -11.925))
                ThreePointArc((13.528992375, -11.925), (11.702708088, -11.305060021), (10.631214896, -9.701457135))
                Line((10.631214896, -9.701457135), (9.931851653, -7.091397978))
                ThreePointArc((9.931851653, -7.091397978), (9.217522858, -6.022329387), (8, -5.609036068))
                Line((8, -5.609036068), (-8, -5.609036068))
                ThreePointArc((-8, -5.609036068), (-9.217522858, -6.022329387), (-9.931851653, -7.091397978))
                Line((-9.931851653, -7.091397978), (-10.631214896, -9.701457135))
                ThreePointArc((-10.631214896, -9.701457135), (-11.702708088, -11.305060021), (-13.528992375, -11.925))
                Line((-13.528992375, -11.925), (-27.225, -11.925))
                ThreePointArc((-27.225, -11.925), (-29.4877417, -10.9877417), (-30.425, -8.725))
                Line((-30.425, -8.725), (-30.425, 8.725))
                ThreePointArc((-30.425, 8.725), (-29.4877417, 10.9877417), (-27.225, 11.925))
            make_face()
        extrude(amount=-SCHNITT_LINEAR_AUSTRAGEN4_DEPTH, mode=Mode.SUBTRACT)
    add(part_1.part.scale(1), mode=Mode.REPLACE)  # the faces are merged on a copy

    # Fase2
    fase2_edges = [part_1.edges().sort_by_distance(p)[0] for p in [
        (-29.4877417, 10.9877417, 4.2000508),
        (-30.425, 0, 4.2000508),
        (-29.4877417, -10.9877417, 4.2000508),
        (-20.376996187, -11.925, 4.2000508),
        (-11.702708088, -11.305060021, 4.2000508),
        (-10.281533274, -8.396427557, 4.2000508),
        (-9.217522858, -6.022329387, 4.2000508),
        (0, -5.609036068, 4.2000508),
        (9.217522858, -6.022329387, 4.2000508),
        (10.281533274, -8.396427557, 4.2000508),
        (11.702708088, -11.305060021, 4.2000508),
        (20.376996187, -11.925, 4.2000508),
        (29.4877417, -10.9877417, 4.2000508),
        (30.425, 0, 4.2000508),
        (29.4877417, 10.9877417, 4.2000508),
        (0, 11.925, 4.2000508),
    ]]
    chamfer(fase2_edges, length=FASE2_SIZE)


solid = part_1.part
